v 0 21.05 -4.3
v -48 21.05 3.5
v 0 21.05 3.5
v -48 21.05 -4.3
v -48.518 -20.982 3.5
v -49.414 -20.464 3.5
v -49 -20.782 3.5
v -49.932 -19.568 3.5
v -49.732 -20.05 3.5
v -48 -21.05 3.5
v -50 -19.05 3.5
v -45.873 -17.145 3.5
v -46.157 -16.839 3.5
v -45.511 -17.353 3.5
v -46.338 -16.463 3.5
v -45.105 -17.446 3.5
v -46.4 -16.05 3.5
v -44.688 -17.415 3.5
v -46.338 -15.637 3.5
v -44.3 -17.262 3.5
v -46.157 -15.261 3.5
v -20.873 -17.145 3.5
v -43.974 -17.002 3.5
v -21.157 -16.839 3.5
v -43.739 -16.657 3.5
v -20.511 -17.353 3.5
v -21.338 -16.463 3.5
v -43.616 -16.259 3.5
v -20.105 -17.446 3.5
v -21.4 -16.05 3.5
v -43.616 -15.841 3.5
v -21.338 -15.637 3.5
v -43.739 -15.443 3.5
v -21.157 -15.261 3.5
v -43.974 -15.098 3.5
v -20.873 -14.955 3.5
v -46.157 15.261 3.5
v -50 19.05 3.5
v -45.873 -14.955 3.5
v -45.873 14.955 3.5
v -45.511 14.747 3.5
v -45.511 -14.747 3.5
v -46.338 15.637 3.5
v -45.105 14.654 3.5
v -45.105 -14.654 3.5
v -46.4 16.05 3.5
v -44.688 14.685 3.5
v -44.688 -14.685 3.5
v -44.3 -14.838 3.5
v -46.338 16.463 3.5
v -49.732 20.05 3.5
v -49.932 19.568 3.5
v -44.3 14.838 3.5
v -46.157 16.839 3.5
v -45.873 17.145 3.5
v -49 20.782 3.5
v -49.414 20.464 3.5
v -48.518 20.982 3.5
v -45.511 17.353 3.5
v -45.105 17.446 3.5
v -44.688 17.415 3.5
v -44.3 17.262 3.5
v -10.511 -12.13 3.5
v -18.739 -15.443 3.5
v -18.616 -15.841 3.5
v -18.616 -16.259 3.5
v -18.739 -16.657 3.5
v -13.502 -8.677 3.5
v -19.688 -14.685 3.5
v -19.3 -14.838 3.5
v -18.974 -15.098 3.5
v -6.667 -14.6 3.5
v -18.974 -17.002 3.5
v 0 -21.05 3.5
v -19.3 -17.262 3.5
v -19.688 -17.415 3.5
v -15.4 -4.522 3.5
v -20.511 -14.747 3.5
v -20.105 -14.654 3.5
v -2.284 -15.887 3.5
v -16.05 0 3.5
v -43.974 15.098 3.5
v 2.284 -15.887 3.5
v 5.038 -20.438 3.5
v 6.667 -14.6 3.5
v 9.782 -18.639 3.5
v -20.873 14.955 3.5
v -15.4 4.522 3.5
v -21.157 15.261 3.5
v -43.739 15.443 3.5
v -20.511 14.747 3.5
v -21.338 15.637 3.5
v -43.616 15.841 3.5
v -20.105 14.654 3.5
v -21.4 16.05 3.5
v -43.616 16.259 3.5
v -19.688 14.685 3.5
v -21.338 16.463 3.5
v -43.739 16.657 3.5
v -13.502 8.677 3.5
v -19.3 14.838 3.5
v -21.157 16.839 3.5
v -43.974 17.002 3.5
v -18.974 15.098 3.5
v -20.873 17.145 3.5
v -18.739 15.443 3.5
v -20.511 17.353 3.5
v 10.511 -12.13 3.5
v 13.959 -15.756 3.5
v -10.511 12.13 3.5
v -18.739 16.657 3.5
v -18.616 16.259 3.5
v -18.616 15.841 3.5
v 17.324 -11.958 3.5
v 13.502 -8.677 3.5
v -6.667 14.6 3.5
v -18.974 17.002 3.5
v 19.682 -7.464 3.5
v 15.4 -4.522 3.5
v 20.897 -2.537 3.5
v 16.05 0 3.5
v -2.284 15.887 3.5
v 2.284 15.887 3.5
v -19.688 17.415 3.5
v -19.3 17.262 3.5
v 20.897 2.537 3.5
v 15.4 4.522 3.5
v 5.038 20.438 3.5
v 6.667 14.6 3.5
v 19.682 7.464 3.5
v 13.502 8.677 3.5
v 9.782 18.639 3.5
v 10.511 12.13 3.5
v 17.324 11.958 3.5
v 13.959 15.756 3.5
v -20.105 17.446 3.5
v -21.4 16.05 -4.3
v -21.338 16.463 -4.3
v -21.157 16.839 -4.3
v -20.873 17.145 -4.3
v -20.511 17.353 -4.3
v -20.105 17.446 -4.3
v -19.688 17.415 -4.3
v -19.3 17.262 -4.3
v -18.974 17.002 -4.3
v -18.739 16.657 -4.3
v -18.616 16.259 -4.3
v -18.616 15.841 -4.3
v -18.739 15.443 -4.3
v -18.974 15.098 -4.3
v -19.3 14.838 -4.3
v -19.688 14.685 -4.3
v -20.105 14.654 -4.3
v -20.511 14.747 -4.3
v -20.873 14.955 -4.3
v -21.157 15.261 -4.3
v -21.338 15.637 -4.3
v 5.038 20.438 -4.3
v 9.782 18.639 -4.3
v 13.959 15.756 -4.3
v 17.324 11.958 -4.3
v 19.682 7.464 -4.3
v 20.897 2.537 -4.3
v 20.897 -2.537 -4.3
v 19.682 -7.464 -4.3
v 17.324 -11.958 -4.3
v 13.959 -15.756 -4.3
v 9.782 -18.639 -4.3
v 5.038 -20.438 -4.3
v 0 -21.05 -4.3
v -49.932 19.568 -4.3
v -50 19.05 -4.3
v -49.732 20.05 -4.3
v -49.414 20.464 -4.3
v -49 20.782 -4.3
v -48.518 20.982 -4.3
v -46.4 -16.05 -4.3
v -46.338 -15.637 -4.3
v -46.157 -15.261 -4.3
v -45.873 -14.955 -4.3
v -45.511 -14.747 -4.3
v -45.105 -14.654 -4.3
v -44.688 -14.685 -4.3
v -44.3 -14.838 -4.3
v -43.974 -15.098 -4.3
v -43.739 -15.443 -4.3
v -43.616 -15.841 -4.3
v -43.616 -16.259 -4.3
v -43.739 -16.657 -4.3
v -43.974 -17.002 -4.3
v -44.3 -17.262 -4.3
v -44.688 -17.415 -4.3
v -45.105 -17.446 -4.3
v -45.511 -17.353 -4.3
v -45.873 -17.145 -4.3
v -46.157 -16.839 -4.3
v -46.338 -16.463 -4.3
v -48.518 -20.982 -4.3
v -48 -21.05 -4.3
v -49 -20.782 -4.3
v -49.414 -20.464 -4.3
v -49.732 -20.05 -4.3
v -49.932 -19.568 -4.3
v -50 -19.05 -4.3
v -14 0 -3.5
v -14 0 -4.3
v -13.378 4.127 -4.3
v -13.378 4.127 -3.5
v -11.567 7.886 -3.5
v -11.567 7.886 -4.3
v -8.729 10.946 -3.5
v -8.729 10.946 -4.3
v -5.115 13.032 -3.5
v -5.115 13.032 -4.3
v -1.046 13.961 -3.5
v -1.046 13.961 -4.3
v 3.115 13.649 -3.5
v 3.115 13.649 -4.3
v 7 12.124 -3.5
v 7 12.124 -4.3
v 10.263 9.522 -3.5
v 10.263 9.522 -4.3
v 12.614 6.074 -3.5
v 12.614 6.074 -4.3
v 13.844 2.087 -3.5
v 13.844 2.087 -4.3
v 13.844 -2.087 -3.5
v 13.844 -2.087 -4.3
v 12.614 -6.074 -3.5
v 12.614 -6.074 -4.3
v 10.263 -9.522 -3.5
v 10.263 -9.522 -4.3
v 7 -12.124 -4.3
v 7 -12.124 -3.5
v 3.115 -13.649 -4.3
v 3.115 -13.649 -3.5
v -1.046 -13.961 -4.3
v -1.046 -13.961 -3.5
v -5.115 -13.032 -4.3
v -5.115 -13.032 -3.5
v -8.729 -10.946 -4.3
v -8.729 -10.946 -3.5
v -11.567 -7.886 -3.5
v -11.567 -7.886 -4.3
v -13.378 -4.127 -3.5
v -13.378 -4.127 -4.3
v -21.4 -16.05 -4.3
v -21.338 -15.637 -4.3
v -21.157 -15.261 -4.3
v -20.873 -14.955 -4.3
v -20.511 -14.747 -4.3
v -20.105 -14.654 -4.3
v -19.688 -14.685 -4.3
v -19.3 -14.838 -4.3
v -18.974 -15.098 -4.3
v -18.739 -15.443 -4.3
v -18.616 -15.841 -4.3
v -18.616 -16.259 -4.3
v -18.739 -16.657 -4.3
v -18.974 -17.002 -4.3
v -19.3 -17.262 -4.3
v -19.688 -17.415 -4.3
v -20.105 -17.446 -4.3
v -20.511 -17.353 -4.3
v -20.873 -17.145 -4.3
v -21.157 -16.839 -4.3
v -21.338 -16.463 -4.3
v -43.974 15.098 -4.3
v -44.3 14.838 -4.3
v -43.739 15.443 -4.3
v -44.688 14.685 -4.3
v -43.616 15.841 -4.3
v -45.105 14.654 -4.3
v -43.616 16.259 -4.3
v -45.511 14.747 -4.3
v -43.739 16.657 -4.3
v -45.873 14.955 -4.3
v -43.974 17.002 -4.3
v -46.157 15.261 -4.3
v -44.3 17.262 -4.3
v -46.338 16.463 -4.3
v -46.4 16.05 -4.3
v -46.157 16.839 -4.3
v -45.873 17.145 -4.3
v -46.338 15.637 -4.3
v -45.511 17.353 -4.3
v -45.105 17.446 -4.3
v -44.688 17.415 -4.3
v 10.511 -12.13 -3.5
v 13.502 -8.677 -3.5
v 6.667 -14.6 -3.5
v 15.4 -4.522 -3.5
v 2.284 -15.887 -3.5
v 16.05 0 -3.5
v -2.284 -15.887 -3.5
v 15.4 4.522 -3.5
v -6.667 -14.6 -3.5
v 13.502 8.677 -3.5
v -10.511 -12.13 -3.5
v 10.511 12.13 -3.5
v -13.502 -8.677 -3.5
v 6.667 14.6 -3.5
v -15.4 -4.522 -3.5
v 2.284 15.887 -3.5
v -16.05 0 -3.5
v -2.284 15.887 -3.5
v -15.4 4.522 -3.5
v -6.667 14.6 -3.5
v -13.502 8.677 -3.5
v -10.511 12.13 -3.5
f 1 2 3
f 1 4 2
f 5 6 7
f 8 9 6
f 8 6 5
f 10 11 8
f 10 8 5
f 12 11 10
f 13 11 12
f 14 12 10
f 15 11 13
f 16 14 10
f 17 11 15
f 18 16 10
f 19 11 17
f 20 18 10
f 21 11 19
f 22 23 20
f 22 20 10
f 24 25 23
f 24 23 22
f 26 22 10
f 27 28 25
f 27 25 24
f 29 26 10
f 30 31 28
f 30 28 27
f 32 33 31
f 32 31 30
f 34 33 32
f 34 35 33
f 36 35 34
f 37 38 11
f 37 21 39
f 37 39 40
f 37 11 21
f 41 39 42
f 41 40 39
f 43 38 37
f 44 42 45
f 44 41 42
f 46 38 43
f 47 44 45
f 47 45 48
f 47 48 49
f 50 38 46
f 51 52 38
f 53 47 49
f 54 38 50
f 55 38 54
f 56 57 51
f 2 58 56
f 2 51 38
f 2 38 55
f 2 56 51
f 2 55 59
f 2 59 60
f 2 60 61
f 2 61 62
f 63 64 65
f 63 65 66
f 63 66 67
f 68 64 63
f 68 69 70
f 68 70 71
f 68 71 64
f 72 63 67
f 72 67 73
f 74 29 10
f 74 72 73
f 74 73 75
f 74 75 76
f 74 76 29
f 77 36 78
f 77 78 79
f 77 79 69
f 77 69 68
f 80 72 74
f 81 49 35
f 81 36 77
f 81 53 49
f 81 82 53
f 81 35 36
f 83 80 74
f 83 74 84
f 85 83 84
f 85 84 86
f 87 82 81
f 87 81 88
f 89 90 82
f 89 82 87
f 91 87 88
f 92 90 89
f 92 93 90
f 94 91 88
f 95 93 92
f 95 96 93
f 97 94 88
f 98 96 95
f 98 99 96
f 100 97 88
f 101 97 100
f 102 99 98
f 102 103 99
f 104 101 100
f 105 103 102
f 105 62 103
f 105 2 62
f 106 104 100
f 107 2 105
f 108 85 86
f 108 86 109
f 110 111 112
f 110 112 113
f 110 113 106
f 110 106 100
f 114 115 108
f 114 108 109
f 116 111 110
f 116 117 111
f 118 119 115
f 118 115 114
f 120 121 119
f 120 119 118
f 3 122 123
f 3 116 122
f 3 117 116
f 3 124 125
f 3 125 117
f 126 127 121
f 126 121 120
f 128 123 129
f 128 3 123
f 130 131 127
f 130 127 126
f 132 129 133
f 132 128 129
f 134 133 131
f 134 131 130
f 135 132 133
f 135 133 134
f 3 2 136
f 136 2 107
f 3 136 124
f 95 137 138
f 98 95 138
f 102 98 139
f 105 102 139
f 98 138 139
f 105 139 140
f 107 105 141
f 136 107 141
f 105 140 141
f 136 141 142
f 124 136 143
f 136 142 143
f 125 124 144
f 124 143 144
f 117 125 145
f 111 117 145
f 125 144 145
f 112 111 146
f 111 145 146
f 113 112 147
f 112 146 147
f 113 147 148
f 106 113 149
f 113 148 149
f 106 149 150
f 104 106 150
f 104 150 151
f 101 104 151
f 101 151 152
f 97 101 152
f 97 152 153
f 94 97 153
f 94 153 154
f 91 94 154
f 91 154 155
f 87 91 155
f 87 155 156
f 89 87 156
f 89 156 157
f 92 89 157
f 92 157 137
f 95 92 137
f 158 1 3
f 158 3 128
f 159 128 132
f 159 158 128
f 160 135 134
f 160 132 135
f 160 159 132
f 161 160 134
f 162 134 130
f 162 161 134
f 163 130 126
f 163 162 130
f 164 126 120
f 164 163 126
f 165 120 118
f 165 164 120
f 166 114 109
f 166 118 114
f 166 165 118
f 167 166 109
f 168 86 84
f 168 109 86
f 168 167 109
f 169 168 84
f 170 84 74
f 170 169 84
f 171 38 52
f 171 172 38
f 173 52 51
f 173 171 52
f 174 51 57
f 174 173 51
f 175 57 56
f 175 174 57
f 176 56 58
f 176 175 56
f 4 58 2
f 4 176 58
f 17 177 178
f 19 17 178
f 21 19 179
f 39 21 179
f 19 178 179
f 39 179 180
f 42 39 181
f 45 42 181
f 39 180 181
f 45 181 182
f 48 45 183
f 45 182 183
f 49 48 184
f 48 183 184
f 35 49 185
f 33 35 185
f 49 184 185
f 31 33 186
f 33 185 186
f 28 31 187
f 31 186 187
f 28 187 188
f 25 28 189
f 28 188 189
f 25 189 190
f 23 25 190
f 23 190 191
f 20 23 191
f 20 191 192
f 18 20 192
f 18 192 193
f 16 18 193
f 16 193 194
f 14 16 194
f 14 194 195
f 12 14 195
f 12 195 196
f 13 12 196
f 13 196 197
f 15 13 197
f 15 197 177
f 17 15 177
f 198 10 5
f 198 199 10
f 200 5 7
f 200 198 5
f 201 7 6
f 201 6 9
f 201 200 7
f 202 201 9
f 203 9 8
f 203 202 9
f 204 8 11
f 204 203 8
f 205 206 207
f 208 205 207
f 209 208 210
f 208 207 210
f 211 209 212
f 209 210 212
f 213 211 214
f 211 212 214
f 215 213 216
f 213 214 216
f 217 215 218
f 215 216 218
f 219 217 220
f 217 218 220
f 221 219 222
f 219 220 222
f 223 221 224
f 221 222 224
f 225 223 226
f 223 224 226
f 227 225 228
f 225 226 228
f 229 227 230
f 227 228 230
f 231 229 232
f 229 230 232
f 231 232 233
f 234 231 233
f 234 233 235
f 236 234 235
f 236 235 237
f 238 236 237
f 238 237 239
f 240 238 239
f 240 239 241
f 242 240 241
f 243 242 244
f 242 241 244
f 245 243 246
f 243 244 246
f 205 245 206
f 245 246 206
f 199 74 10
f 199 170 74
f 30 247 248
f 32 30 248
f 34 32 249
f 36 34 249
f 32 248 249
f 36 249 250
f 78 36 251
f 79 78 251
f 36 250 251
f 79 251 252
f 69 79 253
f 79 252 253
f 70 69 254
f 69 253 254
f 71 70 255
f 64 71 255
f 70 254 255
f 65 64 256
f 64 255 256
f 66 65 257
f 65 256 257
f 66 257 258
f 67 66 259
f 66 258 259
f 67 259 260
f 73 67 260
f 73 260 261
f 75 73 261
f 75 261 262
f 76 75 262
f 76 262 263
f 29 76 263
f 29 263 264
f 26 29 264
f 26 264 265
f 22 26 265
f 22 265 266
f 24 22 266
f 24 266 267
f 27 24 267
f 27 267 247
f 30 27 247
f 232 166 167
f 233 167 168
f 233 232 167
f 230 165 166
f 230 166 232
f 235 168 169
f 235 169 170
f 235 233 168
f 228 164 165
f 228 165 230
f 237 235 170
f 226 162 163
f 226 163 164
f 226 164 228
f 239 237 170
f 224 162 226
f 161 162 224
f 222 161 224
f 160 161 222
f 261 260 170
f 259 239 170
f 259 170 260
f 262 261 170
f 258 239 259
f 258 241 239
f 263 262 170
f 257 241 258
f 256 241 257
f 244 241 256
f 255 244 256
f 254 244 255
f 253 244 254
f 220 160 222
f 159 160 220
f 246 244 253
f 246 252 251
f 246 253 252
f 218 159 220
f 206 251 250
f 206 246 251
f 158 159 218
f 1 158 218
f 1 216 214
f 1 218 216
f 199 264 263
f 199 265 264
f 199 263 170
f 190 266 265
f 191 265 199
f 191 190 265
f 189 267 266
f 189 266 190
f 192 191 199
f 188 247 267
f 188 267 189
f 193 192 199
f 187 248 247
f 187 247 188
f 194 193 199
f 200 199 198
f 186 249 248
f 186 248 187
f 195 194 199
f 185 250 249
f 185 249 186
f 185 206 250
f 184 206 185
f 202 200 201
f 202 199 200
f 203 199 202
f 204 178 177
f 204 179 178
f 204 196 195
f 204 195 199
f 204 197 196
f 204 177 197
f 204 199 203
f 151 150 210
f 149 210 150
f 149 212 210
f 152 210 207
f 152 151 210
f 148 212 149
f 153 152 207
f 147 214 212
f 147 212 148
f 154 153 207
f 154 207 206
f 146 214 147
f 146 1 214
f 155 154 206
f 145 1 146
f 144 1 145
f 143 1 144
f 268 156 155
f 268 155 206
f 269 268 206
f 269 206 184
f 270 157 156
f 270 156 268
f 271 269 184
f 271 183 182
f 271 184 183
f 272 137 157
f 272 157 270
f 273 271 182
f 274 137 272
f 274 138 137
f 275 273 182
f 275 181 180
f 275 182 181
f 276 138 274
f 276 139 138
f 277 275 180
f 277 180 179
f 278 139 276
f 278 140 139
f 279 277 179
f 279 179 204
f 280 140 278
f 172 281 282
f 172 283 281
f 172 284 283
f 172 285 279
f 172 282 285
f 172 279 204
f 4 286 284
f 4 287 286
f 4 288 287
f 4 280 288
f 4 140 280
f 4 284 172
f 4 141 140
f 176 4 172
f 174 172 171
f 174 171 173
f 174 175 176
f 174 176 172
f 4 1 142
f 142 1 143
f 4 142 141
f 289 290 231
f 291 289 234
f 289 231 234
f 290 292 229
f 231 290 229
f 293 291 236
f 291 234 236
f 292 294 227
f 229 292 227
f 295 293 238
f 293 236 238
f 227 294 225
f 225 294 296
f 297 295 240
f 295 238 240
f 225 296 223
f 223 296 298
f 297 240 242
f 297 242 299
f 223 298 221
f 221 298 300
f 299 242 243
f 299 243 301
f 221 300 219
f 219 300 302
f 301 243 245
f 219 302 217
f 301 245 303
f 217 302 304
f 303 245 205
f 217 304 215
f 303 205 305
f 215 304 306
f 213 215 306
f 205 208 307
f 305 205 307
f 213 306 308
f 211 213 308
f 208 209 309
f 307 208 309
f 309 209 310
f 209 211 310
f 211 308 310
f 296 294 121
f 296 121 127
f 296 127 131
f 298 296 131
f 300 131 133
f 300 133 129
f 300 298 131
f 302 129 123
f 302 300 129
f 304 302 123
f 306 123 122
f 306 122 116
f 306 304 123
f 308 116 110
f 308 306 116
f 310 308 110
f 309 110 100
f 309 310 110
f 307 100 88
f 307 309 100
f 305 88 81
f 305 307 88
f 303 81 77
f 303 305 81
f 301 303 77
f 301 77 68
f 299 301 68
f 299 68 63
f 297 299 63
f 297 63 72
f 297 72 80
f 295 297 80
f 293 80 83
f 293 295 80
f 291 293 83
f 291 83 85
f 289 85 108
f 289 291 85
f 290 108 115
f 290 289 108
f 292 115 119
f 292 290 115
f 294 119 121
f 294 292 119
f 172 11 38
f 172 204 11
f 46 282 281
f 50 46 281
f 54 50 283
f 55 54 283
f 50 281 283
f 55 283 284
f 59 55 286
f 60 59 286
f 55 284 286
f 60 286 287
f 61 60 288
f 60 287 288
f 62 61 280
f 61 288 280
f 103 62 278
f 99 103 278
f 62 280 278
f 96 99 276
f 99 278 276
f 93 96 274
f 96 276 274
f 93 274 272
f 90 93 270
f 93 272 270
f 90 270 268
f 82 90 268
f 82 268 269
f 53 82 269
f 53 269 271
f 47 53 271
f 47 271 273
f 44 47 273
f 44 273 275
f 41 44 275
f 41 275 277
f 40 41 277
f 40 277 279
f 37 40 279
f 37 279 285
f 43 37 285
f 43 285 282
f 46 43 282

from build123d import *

# Parameters (mm, degrees)
BOSS_EXTRUDE1_DEPTH      = 3.5
BOSS_EXTRUDE1_DEPTH_BACK = 3.5
SKETCH1_R                = 16.05
BOSS_EXTRUDE2_START      = 0.8
SKETCH2_R                = 14
BOSS_EXTRUDE2_DEPTH      = 0.8
SKETCH3_R                = 1.4
CUT_EXTRUDE1_DEPTH       = 55.80823387
FILLET1_R                = 2


with BuildPart() as part:
    # Sketch1 → Boss-Extrude1 (new, two sides: drawn at the far end of the back side and taken through both)
    with BuildSketch(Plane.XY.offset(-BOSS_EXTRUDE1_DEPTH_BACK)):
        with BuildLine():
            Line((0, 21.05), (-50, 21.05))
            Line((-50, 21.05), (-50, -21.05))
            Line((-50, -21.05), (0, -21.05))
            ThreePointArc((0, -21.05), (21.05, 0), (0, 21.05))
        make_face()
        Circle(SKETCH1_R, mode=Mode.SUBTRACT)
    extrude(amount=BOSS_EXTRUDE1_DEPTH + BOSS_EXTRUDE1_DEPTH_BACK)

    # Sketch2 → Boss-Extrude2 (add)
    with BuildSketch(Plane(origin=(0, 0, -3.5), x_dir=(-1, 0, 0), z_dir=(0, 0, -1)).offset(BOSS_EXTRUDE2_START)):
        with BuildLine():
            Line((0, -21.05), (50, -21.05))
            Line((50, -21.05), (50, 21.05))
            Line((50, 21.05), (0, 21.05))
            ThreePointArc((0, 21.05), (-21.05, 0), (0, -21.05))
        make_face()
        Circle(SKETCH2_R, mode=Mode.SUBTRACT)
    extrude(amount=-BOSS_EXTRUDE2_DEPTH)

    # Sketch3 → Cut-Extrude1 (cut, through all)
    with BuildSketch(Plane(origin=(0, 0, -4.3), x_dir=(-1, 0, 0), z_dir=(0, 0, -1))):
        with Locations((20, 16.05)):
            Circle(SKETCH3_R)
        with Locations((45, 16.05)):
            Circle(SKETCH3_R)
        with Locations((45, -16.05)):
            Circle(SKETCH3_R)
        with Locations((20, -16.05)):
            Circle(SKETCH3_R)
    extrude(amount=-CUT_EXTRUDE1_DEPTH, mode=Mode.SUBTRACT)

    # Fillet1
    fillet1_edges = [part.edges().sort_by_distance(p)[0] for p in [
        (-50, -21.05, -0.4),
        (-50, 21.05, -0.4),
    ]]
    fillet(fillet1_edges, radius=FILLET1_R)


solid = part.part
